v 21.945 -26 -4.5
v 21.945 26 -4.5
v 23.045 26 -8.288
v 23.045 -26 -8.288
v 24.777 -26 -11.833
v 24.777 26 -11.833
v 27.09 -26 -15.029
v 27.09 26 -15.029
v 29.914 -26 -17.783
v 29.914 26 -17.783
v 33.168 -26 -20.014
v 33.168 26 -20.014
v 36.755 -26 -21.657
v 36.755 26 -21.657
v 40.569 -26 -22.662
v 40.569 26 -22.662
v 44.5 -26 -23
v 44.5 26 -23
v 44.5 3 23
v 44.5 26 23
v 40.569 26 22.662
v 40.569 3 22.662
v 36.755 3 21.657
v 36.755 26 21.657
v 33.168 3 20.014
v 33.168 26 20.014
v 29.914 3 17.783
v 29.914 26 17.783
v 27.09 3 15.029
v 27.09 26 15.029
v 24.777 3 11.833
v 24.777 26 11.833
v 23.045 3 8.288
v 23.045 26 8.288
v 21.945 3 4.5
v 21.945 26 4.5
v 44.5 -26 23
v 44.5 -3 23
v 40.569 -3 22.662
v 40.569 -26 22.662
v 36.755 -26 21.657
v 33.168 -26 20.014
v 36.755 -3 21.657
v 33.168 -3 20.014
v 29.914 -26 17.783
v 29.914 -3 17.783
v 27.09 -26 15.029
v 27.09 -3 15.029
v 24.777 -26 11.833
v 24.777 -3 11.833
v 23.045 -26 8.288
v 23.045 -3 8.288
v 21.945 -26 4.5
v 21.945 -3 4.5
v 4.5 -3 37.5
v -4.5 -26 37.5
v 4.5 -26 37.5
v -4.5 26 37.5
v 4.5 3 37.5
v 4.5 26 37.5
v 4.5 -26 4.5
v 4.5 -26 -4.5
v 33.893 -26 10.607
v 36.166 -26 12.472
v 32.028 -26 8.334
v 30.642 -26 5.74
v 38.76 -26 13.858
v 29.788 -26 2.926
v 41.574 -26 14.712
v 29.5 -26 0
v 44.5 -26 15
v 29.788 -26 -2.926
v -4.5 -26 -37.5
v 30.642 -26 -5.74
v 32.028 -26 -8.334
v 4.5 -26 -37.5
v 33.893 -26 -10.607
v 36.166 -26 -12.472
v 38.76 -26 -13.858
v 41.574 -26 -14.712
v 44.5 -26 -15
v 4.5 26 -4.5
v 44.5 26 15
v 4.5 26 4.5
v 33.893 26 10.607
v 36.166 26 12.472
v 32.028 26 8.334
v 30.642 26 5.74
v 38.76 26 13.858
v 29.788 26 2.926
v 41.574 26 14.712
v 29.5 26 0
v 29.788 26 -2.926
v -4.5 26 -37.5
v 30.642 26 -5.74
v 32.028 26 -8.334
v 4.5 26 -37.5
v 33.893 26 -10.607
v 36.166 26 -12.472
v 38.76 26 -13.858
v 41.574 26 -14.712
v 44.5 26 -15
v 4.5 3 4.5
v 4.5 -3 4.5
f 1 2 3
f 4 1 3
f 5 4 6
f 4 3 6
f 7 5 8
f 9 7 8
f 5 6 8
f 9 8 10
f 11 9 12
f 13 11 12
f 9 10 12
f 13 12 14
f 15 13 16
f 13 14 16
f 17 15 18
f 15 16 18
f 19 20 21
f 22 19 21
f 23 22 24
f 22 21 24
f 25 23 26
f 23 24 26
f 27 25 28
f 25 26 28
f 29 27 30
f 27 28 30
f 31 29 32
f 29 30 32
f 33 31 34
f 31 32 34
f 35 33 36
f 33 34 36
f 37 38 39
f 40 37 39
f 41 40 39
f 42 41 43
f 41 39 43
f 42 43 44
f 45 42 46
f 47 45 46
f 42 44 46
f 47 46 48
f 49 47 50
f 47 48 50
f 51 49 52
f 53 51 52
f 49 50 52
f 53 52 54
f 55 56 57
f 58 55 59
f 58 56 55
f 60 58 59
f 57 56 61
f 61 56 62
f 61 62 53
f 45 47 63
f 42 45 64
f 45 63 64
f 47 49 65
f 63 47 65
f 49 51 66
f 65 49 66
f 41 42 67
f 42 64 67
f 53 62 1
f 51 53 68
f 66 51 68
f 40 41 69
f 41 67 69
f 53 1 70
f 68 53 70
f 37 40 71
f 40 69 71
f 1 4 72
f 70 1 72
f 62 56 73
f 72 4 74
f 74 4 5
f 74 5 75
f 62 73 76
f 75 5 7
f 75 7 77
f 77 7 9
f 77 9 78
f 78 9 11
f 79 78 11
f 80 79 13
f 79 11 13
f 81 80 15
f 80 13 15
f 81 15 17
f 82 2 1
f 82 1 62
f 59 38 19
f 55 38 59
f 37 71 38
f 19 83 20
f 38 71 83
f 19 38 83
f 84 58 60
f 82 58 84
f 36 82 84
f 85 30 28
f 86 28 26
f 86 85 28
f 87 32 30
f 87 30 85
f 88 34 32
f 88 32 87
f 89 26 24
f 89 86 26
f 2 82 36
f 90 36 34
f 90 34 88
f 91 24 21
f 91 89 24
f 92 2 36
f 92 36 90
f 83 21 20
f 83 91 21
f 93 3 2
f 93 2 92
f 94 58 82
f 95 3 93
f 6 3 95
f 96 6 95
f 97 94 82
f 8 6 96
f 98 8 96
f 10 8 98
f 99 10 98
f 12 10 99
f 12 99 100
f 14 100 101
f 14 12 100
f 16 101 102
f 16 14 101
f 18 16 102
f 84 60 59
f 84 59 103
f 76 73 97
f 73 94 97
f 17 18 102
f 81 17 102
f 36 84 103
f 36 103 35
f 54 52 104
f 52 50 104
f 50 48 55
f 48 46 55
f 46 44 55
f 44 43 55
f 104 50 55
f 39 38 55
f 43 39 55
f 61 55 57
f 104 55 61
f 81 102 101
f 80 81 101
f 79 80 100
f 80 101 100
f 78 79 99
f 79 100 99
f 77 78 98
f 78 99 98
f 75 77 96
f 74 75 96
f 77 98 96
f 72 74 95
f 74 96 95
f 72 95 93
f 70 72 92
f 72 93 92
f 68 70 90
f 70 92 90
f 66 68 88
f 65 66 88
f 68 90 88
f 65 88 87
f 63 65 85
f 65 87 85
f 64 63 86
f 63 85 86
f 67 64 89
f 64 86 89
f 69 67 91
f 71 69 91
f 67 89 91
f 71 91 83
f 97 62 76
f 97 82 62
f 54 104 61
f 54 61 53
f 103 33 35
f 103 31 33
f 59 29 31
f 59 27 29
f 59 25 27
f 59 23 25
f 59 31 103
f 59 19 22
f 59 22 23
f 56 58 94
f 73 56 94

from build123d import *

# Parameters (mm, degrees)
SKETCH1_W           = 9
SKETCH1_H           = 75
BOSS_EXTRUDE1_DEPTH = 26
RIB3_REACH          = 65.738
SKETCH3_WALL_W      = 172.022520638
SKETCH3_WALL_H      = 6


with BuildPart() as part:
    # Sketch1 → Boss-Extrude1 (new, symmetric)
    with BuildSketch(Plane(origin=(0, 0, 0), x_dir=(1, 0, 0), z_dir=(0, 1, 0))):
        Rectangle(SKETCH1_W, SKETCH1_H)
        with BuildLine():
            Line((4.5, 4.5), (4.5, -4.5))
            Line((4.5, -4.5), (21.944512863, -4.5))
            ThreePointArc((21.944512863, -4.5), (21.5, 0), (21.944512863, 4.5))
            Line((21.944512863, 4.5), (4.5, 4.5))
        make_face()
        with BuildLine():
            Line((44.5, -15), (44.5, -23))
            ThreePointArc((44.5, -23), (21.5, 0), (44.5, 23))
            Line((44.5, 23), (44.5, 15))
            ThreePointArc((44.5, 15), (29.5, 0), (44.5, -15))
        make_face()
    extrude(amount=BOSS_EXTRUDE1_DEPTH, both=True)

    # Sketch3 wall → Rib3 (add, up to next)
    with BuildSketch(Plane(origin=(24.5, 0, 30.25), x_dir=(-0.940136065162, 0, 0.340799323621), z_dir=(0.340799323621, 0, 0.940136065162)), mode=Mode.PRIVATE) as rib3_sk1:
        Rectangle(SKETCH3_WALL_W, SKETCH3_WALL_H)
    rib3_tool1 = extrude(rib3_sk1.sketch, amount=-RIB3_REACH, mode=Mode.PRIVATE) - part.part
    add(rib3_tool1.solids().sort_by_distance((24.5, 0, 30.25))[0])


solid = part.part
